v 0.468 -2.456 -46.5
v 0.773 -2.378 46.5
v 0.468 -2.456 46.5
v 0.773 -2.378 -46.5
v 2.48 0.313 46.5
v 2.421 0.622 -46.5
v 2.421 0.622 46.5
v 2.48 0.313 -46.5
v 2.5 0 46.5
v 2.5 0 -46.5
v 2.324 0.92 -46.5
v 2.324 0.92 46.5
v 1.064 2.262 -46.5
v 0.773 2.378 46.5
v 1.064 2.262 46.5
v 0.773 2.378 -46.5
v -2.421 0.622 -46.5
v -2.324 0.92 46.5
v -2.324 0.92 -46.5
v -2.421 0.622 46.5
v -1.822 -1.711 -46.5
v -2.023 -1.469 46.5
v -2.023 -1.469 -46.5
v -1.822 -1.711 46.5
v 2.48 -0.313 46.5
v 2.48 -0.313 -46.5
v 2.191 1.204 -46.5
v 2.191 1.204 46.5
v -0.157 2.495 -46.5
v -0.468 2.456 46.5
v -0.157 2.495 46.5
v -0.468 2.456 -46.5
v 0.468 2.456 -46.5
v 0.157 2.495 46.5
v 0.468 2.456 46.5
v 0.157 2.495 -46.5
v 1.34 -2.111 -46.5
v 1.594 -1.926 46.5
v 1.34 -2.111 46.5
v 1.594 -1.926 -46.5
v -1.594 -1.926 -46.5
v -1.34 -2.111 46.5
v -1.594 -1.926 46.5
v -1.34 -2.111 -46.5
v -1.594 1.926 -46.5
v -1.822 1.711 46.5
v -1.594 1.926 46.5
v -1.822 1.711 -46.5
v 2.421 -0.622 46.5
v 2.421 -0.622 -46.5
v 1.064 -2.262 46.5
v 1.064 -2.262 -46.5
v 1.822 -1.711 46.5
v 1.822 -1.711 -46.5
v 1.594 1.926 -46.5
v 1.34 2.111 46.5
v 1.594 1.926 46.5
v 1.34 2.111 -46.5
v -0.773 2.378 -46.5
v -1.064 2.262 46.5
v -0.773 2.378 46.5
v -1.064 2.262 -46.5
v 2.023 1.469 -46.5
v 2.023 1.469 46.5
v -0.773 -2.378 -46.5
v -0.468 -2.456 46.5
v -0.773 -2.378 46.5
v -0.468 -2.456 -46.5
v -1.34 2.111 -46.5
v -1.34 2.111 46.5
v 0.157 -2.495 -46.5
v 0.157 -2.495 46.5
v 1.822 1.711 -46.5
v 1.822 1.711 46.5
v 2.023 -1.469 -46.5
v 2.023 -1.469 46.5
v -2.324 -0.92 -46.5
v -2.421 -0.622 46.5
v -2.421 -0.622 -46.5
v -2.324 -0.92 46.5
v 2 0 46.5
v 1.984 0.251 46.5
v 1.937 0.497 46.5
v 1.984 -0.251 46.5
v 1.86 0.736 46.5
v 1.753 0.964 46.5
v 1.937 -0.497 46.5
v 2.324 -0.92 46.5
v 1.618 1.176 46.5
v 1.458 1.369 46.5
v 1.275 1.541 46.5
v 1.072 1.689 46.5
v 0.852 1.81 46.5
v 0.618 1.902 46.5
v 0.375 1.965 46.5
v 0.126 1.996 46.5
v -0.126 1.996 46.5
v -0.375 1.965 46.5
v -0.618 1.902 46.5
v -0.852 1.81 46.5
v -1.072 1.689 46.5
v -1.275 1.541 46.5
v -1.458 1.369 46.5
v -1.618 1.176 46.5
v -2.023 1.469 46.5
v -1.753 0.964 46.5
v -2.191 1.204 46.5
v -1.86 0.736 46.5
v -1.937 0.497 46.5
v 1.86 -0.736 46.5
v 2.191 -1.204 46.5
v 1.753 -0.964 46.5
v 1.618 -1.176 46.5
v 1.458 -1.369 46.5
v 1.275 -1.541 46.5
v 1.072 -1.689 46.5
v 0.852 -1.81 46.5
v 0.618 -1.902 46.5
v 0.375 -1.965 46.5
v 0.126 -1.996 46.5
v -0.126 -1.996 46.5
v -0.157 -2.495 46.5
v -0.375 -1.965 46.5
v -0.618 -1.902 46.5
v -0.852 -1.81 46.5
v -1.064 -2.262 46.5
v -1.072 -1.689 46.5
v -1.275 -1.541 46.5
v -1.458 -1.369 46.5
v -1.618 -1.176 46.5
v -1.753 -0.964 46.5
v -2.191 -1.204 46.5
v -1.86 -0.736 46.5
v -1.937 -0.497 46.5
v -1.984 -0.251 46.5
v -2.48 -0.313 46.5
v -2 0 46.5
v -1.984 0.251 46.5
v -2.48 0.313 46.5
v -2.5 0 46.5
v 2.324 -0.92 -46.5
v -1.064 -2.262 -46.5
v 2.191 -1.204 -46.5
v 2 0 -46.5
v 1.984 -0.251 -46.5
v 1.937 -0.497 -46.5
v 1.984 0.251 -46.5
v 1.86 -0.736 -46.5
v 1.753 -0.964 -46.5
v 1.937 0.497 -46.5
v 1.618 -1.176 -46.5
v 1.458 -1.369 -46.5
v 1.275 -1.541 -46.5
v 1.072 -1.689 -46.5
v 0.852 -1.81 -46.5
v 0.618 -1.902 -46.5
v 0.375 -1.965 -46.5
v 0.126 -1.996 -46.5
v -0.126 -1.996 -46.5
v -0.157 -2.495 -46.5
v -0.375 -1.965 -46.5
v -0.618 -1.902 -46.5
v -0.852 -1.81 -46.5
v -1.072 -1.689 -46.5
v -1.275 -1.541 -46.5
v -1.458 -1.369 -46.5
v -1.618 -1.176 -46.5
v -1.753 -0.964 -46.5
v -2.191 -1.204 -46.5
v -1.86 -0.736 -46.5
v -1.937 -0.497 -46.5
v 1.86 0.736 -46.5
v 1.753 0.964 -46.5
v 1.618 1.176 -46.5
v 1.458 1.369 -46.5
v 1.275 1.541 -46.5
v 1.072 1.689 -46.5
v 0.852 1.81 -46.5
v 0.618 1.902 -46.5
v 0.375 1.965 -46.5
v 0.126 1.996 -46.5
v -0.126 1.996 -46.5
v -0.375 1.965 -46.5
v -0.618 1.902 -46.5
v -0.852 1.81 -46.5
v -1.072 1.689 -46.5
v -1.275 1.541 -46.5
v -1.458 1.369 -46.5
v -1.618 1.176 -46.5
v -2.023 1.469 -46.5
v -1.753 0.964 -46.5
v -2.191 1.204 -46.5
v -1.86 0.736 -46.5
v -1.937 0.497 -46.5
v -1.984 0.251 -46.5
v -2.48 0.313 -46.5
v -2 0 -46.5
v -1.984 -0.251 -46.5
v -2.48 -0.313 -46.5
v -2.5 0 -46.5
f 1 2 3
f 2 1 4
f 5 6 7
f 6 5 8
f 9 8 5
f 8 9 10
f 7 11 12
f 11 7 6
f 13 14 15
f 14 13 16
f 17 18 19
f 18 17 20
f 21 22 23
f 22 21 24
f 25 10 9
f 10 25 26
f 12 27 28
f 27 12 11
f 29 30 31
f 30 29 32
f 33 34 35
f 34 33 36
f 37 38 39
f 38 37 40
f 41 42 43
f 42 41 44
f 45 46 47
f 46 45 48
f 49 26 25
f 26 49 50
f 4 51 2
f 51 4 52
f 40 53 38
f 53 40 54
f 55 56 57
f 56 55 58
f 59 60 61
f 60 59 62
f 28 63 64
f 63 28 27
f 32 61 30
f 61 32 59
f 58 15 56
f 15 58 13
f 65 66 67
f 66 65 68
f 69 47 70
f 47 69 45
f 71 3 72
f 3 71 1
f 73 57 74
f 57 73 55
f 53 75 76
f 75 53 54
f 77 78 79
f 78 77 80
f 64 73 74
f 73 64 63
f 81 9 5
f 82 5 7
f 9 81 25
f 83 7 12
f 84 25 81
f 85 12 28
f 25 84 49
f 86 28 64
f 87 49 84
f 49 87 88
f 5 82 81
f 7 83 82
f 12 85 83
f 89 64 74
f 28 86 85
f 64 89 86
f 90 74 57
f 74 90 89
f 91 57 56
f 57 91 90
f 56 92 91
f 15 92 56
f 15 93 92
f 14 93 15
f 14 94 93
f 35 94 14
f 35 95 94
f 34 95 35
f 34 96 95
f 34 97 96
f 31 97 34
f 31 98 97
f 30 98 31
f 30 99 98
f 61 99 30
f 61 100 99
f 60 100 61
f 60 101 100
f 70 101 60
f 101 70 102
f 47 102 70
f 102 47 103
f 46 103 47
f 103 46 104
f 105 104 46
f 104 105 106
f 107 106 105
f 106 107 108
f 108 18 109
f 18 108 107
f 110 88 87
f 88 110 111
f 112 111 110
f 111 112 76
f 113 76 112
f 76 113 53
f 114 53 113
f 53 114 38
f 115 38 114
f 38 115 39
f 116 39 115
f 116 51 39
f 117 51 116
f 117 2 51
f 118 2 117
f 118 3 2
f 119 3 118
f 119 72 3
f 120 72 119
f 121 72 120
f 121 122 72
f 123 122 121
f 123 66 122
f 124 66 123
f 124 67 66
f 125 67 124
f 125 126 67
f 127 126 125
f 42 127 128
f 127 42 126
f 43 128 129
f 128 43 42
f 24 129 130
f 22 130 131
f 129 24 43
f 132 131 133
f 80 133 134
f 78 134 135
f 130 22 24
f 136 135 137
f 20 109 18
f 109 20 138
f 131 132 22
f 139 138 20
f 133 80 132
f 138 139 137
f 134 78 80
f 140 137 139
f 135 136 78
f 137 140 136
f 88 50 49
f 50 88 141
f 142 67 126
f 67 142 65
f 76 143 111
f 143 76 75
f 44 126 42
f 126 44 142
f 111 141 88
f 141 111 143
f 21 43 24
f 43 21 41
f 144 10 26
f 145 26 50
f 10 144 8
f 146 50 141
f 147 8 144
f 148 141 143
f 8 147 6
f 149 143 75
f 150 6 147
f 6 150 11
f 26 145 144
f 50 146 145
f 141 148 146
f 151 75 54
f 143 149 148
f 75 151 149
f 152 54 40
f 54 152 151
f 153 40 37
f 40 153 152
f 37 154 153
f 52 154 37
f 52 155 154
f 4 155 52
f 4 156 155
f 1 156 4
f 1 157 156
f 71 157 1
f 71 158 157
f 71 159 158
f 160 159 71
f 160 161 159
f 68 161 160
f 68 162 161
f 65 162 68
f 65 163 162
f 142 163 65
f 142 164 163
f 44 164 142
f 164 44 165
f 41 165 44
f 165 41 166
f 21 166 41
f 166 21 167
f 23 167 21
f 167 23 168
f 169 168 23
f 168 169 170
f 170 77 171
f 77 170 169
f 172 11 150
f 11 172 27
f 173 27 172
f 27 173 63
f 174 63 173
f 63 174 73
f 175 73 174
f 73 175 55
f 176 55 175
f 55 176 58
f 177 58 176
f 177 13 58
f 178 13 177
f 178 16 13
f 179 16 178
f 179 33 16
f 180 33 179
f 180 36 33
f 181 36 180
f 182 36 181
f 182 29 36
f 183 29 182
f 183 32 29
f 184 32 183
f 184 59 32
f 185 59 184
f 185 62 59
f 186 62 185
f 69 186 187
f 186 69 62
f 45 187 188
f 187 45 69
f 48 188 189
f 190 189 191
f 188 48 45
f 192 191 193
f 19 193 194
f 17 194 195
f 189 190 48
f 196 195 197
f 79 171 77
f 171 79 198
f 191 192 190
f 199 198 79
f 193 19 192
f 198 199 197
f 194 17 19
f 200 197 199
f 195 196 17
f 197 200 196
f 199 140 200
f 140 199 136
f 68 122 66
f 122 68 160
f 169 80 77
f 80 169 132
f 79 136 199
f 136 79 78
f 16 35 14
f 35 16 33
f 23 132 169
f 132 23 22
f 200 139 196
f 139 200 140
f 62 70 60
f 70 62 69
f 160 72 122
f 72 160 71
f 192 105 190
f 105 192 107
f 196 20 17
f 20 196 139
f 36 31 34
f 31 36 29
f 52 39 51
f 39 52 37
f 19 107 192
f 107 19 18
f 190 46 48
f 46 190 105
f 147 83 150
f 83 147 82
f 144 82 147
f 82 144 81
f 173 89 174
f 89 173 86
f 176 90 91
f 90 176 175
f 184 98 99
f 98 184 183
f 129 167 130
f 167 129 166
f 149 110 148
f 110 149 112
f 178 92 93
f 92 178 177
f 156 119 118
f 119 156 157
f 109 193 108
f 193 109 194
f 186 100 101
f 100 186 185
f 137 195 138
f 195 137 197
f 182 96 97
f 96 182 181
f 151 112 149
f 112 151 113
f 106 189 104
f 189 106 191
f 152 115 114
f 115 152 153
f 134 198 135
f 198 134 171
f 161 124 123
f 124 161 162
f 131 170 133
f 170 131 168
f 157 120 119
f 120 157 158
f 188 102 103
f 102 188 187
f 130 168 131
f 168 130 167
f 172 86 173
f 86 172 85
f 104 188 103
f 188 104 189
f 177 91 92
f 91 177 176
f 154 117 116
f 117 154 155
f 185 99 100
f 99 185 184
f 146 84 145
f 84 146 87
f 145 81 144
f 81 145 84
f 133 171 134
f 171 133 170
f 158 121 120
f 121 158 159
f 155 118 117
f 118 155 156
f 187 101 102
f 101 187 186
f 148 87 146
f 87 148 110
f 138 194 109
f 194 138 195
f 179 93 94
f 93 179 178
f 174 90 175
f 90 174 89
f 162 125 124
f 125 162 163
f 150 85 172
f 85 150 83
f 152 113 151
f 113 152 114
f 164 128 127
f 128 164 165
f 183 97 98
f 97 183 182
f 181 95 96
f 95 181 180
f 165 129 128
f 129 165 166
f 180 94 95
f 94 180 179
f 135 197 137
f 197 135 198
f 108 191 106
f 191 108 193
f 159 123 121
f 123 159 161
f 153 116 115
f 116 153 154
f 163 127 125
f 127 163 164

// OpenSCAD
$fn = 50;


difference() {
	union() {
		translate(v = [0, 0, -46.5000000000]) {
			cylinder(h = 93, r = 2.5000000000);
		}
	}
	union() {
		translate(v = [0, 0, -100.0000000000]) {
			cylinder(h = 200, r = 2.0000000000);
		}
	}
}
